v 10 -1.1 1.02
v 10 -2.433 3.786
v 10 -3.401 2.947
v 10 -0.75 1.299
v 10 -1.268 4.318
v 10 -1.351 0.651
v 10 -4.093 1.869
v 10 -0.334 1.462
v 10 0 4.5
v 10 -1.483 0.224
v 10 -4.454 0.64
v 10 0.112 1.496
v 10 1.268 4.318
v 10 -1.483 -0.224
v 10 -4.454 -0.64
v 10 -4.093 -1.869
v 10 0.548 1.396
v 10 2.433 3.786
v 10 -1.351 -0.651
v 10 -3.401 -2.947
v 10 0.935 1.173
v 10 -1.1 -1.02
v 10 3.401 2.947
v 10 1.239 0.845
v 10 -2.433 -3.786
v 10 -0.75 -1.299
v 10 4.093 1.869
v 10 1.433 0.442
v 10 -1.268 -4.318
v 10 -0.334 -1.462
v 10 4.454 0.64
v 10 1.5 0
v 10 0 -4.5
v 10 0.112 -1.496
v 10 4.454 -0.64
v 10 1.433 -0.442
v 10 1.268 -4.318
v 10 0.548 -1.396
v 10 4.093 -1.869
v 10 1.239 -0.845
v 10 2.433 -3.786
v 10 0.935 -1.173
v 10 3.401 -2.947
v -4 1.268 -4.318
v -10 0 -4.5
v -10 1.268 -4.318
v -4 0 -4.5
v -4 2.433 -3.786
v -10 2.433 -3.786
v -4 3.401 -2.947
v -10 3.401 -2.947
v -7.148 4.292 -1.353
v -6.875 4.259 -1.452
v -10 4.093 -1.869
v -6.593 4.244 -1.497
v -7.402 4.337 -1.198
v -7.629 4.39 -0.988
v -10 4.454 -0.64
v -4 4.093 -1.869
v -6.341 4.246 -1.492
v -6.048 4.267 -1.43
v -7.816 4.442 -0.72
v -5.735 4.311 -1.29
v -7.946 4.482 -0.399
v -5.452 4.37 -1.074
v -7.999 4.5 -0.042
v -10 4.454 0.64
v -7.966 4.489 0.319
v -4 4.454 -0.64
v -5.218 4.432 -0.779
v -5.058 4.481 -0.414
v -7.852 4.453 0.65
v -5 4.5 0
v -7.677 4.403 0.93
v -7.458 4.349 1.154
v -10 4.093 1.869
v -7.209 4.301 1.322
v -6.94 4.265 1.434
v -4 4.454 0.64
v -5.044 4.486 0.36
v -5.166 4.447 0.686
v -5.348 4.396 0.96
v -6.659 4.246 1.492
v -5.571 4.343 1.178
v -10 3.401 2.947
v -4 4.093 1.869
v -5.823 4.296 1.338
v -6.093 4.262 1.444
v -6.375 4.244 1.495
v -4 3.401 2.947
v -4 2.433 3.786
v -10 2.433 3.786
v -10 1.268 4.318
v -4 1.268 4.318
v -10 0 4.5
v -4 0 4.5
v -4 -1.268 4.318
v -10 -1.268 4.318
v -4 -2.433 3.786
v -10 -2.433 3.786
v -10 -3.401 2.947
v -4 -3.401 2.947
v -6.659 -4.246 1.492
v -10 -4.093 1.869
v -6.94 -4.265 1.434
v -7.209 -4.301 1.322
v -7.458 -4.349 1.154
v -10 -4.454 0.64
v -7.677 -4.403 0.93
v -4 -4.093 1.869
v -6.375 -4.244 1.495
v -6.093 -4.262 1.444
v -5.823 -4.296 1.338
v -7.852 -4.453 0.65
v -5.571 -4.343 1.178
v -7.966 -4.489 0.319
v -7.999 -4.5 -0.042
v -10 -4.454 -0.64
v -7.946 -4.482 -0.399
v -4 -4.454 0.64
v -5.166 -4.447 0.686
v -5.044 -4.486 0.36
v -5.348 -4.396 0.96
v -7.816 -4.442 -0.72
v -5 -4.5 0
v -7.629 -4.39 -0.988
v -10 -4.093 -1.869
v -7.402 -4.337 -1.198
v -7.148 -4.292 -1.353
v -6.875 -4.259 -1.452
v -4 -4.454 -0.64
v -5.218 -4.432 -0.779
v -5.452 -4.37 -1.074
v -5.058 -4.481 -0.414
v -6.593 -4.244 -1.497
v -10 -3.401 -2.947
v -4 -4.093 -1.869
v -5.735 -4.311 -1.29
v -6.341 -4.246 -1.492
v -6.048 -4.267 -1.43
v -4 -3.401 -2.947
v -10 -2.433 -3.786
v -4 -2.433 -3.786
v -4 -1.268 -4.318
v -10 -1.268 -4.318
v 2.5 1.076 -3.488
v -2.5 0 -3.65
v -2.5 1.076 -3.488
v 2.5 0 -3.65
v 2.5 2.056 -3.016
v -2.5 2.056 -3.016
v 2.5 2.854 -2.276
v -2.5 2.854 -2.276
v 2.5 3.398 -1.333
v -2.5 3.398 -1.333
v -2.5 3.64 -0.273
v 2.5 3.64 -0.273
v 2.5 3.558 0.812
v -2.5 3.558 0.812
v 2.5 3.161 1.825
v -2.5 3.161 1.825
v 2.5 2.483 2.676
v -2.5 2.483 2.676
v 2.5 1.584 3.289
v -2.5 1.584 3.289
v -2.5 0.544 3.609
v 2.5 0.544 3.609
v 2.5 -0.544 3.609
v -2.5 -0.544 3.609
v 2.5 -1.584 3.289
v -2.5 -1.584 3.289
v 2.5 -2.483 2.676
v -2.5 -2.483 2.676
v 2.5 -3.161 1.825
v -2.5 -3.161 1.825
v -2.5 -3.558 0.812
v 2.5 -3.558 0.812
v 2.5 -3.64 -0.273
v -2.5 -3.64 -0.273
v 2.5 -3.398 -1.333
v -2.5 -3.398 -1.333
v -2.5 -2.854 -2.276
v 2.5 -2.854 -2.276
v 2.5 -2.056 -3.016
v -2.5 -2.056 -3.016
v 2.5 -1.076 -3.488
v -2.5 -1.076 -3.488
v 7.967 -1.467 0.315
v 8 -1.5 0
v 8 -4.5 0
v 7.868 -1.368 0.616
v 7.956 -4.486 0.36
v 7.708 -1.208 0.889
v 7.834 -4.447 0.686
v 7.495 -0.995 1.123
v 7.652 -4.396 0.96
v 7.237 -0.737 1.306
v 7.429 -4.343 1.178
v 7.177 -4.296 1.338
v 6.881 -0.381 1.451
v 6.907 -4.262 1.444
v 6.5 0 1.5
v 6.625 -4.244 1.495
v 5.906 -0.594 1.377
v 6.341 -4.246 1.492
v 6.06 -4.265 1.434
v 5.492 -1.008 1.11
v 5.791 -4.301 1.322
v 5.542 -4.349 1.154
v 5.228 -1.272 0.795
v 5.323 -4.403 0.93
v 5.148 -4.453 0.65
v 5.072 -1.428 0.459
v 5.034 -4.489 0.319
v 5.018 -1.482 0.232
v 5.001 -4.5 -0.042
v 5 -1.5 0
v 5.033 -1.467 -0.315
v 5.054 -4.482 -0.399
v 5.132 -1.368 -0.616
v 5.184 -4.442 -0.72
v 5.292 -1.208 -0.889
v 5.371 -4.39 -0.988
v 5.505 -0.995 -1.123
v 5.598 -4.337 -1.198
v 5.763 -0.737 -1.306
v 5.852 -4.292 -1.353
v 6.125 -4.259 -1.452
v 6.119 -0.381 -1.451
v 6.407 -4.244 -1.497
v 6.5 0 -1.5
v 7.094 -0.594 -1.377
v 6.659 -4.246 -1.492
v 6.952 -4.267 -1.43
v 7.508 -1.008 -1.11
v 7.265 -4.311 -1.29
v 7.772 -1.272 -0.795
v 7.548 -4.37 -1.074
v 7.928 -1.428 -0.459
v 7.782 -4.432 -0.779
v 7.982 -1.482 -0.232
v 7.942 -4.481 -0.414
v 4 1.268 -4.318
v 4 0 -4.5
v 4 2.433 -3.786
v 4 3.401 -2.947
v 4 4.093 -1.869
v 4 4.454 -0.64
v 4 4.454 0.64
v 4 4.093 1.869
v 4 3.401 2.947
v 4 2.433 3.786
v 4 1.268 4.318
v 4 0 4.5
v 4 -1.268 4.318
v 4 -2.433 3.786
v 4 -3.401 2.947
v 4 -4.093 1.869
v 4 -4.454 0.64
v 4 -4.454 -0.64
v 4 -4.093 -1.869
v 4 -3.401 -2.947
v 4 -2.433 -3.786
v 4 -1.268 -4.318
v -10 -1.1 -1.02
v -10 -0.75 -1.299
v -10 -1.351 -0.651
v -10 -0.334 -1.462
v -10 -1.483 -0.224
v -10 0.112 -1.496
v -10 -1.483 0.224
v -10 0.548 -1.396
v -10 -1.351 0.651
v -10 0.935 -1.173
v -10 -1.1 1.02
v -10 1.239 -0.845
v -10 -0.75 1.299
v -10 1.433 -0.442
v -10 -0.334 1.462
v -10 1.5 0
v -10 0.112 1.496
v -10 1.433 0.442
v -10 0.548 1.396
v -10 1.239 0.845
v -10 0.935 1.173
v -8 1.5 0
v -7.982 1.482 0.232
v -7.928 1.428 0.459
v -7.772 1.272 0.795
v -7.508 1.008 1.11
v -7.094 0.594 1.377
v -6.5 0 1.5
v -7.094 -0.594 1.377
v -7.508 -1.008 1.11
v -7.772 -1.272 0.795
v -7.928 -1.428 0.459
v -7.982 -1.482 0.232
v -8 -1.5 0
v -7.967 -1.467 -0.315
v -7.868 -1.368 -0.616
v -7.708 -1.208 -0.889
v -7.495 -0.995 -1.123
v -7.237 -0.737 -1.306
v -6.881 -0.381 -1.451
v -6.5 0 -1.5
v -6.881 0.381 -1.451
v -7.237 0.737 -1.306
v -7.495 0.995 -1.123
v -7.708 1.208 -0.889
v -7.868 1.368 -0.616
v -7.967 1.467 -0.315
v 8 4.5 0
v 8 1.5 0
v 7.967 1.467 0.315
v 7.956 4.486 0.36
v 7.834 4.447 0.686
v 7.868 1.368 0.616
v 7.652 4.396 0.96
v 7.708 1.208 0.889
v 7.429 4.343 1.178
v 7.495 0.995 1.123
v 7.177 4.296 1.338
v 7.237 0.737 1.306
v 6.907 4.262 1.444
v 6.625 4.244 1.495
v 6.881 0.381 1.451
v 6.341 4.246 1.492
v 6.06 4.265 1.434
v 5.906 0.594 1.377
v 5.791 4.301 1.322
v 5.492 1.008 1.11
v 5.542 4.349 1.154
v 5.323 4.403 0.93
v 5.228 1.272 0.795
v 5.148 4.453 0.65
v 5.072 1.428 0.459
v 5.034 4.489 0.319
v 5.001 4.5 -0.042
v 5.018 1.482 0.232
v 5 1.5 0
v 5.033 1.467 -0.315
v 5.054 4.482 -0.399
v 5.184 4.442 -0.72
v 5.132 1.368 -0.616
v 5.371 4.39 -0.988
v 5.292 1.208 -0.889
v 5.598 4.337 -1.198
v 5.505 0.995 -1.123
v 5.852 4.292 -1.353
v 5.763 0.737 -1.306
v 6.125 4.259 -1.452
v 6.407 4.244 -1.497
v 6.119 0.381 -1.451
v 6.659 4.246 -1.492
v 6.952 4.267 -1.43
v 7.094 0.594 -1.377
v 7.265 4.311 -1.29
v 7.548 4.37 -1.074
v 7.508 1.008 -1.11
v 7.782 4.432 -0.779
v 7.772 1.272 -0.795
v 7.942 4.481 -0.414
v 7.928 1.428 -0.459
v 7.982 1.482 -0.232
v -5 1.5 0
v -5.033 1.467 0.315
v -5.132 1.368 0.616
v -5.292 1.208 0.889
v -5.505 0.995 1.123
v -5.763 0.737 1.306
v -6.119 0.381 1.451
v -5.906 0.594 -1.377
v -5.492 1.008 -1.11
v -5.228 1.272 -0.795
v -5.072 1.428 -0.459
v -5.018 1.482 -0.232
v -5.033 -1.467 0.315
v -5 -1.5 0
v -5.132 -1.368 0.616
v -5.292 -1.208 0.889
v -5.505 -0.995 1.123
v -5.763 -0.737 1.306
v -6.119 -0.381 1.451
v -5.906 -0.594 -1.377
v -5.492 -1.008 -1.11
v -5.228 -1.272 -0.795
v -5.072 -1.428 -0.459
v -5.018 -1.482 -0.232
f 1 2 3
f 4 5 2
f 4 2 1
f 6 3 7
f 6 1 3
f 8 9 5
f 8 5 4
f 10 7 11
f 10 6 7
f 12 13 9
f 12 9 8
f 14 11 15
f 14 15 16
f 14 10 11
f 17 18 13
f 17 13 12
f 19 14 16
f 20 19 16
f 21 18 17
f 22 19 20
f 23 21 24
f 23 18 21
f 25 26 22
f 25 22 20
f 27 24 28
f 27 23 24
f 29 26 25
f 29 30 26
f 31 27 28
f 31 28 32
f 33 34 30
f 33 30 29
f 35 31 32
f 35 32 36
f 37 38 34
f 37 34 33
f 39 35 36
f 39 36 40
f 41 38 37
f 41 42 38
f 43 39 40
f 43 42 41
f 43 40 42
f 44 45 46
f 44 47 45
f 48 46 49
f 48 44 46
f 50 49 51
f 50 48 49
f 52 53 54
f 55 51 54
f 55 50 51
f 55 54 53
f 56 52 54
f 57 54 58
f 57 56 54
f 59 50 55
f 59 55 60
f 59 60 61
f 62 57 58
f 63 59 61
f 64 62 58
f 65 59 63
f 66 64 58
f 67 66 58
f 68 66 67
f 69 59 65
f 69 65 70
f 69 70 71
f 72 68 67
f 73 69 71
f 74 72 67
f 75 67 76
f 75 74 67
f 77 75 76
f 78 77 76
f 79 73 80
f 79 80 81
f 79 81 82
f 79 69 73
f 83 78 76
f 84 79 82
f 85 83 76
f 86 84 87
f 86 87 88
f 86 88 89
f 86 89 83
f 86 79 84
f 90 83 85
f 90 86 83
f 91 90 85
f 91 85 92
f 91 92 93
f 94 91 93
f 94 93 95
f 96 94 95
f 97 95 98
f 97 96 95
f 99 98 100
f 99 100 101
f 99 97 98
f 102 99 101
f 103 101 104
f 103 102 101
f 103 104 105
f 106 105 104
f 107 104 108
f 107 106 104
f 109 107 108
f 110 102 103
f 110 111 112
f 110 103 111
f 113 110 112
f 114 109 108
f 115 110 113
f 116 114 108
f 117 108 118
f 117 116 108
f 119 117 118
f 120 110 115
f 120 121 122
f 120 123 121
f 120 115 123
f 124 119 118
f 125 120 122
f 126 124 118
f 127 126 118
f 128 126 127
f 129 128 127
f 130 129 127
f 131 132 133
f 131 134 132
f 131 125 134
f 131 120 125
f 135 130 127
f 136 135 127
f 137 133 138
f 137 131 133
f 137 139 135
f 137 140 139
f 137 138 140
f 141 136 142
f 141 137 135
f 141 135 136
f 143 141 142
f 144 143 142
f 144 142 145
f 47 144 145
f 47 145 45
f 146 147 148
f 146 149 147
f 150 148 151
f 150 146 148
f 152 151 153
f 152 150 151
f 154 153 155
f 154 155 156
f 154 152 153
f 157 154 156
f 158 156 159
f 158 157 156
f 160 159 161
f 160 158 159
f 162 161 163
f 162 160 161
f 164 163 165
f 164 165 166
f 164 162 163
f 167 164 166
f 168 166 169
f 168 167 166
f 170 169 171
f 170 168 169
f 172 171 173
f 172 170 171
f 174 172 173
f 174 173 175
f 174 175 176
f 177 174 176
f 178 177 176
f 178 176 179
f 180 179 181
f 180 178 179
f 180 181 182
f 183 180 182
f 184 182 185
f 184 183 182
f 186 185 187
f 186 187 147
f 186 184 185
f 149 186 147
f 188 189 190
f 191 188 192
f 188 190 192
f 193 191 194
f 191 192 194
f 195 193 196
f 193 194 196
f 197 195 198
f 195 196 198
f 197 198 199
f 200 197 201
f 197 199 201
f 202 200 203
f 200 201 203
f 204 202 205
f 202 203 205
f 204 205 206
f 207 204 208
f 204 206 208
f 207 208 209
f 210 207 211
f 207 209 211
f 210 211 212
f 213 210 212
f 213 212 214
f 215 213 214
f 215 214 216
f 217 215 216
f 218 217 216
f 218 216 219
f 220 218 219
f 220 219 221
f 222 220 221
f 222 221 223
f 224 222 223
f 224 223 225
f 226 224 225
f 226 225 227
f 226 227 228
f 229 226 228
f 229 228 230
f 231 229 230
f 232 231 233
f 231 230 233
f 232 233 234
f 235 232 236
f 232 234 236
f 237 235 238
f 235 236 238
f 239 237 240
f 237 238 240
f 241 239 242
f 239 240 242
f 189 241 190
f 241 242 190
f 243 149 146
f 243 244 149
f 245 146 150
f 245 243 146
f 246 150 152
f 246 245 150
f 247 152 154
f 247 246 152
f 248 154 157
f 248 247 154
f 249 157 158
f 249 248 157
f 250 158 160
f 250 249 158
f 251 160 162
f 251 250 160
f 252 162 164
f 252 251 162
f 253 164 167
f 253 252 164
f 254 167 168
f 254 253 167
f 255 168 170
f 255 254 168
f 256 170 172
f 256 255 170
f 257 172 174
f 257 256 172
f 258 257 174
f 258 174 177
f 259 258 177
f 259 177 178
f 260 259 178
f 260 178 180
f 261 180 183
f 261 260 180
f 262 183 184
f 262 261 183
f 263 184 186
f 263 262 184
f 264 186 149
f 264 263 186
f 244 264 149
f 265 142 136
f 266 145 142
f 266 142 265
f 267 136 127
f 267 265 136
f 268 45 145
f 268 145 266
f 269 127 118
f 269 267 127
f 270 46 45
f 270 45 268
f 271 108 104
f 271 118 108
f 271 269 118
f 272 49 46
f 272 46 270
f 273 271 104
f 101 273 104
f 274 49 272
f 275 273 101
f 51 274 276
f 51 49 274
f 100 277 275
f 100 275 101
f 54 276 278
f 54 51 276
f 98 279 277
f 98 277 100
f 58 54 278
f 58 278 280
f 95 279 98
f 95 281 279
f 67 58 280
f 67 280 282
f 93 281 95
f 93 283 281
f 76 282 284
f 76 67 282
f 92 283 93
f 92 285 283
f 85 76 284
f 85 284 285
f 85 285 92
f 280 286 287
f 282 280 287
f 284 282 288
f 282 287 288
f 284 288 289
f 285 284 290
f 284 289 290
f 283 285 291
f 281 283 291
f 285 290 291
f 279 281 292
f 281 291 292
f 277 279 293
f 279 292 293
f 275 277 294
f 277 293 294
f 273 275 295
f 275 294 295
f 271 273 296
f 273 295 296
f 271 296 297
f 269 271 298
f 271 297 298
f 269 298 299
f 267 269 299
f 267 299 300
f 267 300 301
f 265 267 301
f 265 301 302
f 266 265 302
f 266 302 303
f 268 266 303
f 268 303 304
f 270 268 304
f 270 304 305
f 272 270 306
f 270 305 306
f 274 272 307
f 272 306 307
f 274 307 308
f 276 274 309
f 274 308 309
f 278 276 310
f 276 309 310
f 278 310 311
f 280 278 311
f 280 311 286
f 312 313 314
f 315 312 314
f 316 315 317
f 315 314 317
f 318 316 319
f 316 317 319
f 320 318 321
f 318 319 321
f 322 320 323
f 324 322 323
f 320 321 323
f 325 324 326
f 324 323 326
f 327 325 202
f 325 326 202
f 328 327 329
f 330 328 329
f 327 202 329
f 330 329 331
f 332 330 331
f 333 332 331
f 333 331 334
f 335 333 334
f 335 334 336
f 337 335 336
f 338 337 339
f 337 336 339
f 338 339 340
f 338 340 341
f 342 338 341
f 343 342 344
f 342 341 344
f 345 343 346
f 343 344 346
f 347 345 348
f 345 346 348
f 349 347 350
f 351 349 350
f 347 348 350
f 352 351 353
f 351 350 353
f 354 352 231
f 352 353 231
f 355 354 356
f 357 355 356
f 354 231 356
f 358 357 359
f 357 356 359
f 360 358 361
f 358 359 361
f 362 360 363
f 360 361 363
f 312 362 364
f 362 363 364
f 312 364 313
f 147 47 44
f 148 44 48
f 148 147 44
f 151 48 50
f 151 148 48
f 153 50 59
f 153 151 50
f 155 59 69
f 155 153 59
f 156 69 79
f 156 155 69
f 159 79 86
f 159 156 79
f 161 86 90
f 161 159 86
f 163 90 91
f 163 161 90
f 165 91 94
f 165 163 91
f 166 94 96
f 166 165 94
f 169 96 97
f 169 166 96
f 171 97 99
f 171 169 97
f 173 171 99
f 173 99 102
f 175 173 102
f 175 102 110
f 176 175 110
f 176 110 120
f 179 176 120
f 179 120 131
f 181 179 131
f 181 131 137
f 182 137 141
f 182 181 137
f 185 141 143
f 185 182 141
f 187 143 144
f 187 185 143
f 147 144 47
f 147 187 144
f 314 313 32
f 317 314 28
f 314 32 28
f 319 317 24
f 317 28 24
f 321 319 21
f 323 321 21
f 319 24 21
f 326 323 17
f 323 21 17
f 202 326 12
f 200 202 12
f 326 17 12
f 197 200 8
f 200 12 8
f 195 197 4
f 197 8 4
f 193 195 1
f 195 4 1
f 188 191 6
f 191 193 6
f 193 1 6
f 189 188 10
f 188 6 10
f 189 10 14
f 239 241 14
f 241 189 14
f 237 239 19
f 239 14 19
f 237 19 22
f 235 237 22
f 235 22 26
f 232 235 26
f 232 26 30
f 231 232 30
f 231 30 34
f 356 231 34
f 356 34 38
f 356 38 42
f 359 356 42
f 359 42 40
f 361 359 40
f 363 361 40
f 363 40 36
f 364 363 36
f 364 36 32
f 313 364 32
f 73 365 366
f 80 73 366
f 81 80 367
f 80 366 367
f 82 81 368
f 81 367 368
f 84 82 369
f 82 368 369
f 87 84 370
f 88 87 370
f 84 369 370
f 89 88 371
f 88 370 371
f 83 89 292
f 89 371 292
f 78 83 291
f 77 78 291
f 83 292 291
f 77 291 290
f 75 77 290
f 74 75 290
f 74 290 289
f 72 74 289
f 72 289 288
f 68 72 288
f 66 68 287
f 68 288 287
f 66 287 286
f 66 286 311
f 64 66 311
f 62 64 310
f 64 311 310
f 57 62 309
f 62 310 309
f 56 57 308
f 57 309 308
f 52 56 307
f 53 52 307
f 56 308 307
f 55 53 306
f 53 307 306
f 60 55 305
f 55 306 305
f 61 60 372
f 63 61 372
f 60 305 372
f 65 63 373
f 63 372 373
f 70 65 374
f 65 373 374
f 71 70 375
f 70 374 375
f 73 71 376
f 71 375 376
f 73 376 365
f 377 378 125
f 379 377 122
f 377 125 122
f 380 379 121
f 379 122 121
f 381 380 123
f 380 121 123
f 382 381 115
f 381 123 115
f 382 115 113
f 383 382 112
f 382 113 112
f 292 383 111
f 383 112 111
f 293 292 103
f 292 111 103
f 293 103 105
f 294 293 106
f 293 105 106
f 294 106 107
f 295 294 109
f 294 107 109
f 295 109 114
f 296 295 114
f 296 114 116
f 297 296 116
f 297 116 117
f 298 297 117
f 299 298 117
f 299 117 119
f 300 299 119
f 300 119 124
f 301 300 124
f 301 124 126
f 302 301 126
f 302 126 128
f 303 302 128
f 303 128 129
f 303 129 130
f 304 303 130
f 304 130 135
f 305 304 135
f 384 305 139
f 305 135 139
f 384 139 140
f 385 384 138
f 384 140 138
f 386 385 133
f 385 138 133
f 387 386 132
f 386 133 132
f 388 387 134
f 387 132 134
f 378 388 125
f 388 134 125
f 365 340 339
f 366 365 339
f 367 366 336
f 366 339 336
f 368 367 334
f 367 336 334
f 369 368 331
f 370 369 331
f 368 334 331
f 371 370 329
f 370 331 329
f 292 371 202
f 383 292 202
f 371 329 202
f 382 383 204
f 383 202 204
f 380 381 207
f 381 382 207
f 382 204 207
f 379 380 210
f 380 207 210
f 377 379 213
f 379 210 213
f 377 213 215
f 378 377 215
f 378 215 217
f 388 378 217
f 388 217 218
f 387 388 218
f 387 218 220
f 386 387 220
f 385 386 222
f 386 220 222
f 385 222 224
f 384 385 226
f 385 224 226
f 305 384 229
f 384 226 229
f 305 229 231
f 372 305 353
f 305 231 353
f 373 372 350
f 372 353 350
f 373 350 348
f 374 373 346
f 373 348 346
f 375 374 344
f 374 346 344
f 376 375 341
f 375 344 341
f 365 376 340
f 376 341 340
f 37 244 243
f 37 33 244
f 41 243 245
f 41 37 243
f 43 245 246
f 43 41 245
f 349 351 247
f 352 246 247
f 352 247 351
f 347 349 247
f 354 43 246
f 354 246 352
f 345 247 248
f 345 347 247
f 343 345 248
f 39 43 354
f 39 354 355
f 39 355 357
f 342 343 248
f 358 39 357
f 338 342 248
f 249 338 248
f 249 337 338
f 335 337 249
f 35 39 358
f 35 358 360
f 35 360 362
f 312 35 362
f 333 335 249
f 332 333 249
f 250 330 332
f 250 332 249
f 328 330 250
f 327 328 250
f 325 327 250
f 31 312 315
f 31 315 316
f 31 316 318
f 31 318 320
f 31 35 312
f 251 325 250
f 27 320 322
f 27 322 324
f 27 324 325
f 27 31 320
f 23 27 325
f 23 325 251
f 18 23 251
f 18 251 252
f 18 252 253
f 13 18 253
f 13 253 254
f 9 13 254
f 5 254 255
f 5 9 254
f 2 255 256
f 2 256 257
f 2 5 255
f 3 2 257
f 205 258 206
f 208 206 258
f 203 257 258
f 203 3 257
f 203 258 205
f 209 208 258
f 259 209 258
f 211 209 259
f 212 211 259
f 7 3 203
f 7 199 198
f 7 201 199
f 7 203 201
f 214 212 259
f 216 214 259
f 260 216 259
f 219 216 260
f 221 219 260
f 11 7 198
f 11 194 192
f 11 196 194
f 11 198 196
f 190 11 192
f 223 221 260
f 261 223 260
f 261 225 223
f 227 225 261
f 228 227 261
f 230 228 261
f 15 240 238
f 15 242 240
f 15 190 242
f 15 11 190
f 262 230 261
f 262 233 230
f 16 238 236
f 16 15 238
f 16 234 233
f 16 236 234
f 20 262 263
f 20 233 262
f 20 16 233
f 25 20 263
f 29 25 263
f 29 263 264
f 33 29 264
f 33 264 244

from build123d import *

# Parameters (mm, degrees)
F2_R          = 1.5
F3_DEPTH      = 4.501
F3_DEPTH_BACK = 4.501
F4_R          = 1.5
F5_DEPTH      = 25
F5_DEPTH_BACK = 25


with BuildPart() as f1:
    # F0 (on Front) → F1 (revolve)
    with BuildSketch(Plane.XZ):
        Polygon((10, 0), (-10, 0), (-10, -4.5), (-4, -4.5), (-2.5, -3.65), (0, -3.65), (2.5, -3.65), (4, -4.5), (10, -4.5), align=None)
    revolve(axis=Axis((0, 0, 0), (1, 0, 0)))

    # F2 (on Front) → F3 (cut, two sides)
    with BuildSketch(Plane.XZ) as f3_sk:
        with Locations((-6.5, 0)):
            Circle(F2_R)
        with Locations((6.5, 0)):
            Circle(F2_R)
    extrude(amount=-F3_DEPTH, mode=Mode.SUBTRACT)
    extrude(f3_sk.sketch, amount=F3_DEPTH_BACK, mode=Mode.SUBTRACT)

    # F4 (on face) → F5 (cut, two sides)
    with BuildSketch(Plane.YZ.offset(10)) as f5_sk:
        Circle(F4_R)
    extrude(amount=-F5_DEPTH, mode=Mode.SUBTRACT)
    extrude(f5_sk.sketch, amount=F5_DEPTH_BACK, mode=Mode.SUBTRACT)


solid = f1.part
